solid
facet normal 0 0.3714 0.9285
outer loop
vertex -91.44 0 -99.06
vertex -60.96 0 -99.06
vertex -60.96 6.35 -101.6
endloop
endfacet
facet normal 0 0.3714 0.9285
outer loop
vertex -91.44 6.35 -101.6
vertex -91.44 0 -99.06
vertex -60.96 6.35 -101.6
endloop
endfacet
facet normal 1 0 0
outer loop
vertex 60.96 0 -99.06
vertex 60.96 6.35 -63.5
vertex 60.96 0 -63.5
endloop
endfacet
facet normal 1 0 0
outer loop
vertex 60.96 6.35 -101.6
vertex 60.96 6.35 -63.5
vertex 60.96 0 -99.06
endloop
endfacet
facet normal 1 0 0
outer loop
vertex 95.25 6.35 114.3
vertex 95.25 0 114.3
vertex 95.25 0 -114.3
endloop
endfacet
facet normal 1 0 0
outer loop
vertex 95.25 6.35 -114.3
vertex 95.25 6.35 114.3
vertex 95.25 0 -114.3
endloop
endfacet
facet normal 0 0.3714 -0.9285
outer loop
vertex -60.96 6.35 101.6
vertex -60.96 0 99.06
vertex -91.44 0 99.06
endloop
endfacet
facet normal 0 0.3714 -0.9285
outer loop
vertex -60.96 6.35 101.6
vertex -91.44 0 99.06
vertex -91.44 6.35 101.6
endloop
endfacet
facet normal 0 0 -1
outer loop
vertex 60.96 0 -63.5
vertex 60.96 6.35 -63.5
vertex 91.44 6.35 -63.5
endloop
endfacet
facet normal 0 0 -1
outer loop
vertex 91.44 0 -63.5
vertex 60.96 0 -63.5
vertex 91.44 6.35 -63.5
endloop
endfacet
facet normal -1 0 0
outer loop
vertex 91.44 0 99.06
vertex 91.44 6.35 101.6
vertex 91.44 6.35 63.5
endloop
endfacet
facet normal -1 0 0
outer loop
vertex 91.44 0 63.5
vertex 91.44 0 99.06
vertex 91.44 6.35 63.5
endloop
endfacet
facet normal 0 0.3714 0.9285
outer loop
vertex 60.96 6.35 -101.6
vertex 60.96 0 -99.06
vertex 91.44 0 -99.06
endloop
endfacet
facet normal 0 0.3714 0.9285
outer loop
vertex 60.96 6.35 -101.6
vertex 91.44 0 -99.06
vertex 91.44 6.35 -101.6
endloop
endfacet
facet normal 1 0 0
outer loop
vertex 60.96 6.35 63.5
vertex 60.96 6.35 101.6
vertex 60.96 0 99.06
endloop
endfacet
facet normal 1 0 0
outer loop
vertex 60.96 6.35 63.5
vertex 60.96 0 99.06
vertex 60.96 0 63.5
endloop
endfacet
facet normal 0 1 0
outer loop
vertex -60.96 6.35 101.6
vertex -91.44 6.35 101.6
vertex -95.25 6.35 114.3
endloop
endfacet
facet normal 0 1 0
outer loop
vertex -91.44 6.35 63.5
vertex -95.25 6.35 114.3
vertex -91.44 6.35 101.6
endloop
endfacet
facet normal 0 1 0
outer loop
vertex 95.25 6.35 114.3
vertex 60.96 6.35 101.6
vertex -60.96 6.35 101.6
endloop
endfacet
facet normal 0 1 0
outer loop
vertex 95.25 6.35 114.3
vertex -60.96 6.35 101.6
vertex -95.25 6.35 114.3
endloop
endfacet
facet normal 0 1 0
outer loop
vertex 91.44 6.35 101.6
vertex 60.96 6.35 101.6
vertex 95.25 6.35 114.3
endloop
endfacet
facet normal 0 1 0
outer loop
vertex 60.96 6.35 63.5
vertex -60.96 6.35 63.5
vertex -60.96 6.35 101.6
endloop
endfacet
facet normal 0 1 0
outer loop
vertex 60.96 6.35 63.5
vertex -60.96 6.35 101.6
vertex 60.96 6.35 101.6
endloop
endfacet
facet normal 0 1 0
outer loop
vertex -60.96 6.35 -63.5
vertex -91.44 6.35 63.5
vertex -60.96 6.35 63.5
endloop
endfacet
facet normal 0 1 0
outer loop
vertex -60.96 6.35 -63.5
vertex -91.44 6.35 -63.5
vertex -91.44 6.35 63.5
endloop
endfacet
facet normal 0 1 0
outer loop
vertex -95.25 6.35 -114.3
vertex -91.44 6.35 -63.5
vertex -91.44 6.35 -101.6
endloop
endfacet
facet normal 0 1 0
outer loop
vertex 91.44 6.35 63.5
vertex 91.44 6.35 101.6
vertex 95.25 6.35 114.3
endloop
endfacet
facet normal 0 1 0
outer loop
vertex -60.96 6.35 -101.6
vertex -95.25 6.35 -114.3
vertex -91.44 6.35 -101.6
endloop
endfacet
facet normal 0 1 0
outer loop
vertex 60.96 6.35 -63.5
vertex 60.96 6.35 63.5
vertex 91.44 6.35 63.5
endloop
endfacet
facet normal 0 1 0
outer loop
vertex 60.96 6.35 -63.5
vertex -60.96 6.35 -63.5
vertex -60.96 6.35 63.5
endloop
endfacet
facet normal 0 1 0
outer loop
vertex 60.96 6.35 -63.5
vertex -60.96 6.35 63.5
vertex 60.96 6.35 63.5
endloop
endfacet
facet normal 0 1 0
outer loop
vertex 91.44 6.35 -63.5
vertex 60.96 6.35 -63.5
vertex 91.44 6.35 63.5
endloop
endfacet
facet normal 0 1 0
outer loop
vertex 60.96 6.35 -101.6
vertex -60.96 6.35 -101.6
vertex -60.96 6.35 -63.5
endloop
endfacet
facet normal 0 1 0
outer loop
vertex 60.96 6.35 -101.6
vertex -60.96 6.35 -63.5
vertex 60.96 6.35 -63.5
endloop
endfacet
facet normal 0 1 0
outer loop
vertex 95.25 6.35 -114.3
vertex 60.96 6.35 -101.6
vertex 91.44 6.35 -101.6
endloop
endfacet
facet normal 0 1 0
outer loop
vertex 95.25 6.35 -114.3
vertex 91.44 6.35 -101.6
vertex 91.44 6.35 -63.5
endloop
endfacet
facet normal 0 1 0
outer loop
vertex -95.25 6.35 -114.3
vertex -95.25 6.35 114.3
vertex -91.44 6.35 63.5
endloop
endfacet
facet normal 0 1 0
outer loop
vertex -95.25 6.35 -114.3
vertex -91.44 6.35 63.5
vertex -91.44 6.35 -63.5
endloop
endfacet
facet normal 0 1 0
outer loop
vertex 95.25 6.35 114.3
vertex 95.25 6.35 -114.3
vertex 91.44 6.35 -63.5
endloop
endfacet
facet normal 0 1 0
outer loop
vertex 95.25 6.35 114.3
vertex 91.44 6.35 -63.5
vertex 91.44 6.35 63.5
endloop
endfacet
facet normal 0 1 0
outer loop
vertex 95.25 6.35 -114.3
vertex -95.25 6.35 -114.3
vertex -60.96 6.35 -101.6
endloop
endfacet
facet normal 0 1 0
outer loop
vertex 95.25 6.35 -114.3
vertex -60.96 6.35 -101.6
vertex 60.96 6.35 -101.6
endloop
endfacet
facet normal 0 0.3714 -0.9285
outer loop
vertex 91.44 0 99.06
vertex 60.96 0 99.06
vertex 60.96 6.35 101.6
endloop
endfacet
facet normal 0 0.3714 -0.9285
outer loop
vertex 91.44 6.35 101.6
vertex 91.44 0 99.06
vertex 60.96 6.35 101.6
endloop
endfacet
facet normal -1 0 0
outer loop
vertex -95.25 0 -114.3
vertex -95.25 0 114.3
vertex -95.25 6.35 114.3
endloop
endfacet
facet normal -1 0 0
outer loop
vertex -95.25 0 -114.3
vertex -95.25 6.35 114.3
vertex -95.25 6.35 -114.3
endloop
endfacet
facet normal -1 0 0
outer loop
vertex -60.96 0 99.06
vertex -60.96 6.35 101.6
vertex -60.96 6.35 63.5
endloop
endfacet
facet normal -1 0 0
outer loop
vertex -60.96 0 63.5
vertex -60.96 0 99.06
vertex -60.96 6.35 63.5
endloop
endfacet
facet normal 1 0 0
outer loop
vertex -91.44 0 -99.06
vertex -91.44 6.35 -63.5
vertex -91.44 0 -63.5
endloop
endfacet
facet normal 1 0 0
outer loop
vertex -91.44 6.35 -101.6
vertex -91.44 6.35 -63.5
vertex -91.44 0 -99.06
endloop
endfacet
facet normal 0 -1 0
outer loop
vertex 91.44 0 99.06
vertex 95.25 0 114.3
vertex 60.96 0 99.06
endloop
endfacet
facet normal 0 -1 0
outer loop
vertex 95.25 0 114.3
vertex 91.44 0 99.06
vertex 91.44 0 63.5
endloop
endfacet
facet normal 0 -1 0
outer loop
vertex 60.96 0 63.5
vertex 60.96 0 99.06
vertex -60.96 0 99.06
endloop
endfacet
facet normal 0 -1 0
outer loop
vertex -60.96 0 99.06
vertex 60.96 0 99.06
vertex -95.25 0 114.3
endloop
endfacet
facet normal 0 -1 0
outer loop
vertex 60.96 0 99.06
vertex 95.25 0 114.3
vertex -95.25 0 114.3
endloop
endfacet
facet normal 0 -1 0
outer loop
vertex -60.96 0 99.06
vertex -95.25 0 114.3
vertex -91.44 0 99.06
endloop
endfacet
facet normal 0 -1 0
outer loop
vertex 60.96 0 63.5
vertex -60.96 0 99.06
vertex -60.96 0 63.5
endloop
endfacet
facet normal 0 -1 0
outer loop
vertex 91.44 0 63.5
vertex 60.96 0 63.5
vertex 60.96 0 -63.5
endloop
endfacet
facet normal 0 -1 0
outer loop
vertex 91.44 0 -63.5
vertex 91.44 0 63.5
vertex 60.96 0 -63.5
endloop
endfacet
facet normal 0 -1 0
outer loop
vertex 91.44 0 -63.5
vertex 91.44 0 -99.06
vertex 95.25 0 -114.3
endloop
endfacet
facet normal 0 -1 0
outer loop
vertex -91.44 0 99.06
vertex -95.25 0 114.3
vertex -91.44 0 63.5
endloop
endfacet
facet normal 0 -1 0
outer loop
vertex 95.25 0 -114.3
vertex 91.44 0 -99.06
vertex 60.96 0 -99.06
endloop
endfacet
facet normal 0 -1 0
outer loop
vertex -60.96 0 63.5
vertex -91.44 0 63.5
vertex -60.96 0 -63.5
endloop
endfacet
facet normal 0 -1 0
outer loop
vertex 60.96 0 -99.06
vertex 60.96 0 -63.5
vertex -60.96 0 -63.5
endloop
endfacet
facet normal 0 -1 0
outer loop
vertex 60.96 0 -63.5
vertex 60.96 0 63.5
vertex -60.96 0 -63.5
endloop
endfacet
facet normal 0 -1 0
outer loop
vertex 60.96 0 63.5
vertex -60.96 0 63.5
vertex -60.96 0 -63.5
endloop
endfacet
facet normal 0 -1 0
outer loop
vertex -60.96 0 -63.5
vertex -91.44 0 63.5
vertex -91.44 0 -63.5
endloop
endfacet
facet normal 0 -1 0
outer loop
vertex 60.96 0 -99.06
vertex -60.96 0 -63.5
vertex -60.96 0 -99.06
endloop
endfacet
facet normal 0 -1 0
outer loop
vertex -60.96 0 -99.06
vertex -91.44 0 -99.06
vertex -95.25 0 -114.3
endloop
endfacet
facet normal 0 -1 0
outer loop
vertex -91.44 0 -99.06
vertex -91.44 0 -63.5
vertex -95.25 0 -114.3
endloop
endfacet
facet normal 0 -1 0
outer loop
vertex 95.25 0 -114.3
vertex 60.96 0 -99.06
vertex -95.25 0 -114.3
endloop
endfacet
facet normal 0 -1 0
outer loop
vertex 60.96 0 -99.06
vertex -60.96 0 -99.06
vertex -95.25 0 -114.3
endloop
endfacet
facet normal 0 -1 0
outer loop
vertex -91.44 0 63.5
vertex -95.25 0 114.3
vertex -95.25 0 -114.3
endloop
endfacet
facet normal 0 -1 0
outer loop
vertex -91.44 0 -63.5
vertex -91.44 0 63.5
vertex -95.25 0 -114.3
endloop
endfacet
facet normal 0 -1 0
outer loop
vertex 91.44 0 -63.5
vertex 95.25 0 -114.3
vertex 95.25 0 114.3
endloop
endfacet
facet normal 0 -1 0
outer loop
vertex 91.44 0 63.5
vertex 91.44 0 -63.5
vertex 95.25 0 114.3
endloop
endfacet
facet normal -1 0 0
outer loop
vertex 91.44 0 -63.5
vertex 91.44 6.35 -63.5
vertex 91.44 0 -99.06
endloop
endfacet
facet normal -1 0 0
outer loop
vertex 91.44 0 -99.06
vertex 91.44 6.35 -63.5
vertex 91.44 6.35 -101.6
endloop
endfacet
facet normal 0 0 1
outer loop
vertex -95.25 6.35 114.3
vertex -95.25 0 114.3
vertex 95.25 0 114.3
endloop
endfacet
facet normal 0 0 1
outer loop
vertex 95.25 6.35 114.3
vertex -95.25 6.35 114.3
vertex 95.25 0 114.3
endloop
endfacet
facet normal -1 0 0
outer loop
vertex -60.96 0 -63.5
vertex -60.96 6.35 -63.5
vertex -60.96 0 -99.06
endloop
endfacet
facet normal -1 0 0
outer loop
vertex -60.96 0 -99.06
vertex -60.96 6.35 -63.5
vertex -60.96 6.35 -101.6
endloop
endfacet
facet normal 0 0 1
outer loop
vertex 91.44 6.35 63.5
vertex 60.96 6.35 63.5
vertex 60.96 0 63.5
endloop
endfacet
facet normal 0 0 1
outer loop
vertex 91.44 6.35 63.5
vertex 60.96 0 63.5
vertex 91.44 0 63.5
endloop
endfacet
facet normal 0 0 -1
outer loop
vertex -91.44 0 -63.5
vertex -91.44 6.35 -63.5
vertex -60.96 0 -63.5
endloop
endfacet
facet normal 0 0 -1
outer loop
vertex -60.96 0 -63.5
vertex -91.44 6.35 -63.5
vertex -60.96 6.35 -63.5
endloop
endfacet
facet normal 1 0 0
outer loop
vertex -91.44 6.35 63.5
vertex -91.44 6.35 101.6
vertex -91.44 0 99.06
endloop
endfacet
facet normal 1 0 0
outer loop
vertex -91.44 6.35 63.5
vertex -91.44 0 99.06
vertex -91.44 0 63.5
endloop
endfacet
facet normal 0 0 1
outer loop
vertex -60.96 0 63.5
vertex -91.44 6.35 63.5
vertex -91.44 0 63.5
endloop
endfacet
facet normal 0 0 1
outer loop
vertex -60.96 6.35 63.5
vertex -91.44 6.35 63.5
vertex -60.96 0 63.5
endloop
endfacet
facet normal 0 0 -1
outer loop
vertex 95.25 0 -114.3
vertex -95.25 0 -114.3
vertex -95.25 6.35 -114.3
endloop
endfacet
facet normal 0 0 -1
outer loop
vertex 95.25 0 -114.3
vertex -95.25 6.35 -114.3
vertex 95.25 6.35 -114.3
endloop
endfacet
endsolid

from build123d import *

# Parameters (mm, degrees)
SKETCH1_W            = 190.5
SKETCH1_H            = 228.6
BOSS_EXTRUDE1_DEPTH  = 6.35
CUT_EXTRUDE1_REACH   = 8.35
SKETCH2_W            = 30.48
SKETCH2_H            = 38.1
BOSS_EXTRUDE2_DEPTH  = 30.48
MIRROR2_COPY_1_DEPTH = 30.48


with BuildPart() as part:
    # Sketch1 → Boss-Extrude1 (new body)
    with BuildSketch(Plane(origin=(0, 0, 0), x_dir=(1, 0, 0), z_dir=(0, 1, 0))):
        Rectangle(SKETCH1_W, SKETCH1_H)
    extrude(amount=BOSS_EXTRUDE1_DEPTH)

    # Sketch2 → Cut-Extrude1 (cut, up to next)
    with BuildSketch(Plane(origin=(0, 6.35, 0), x_dir=(1, 0, 0), z_dir=(0, 1, 0)), mode=Mode.PRIVATE) as cut_extrude1_sk1:
        with Locations((-76.2, 82.55)):
            Rectangle(SKETCH2_W, SKETCH2_H)
    cut_extrude1_tool1 = extrude(cut_extrude1_sk1.sketch, amount=-CUT_EXTRUDE1_REACH, mode=Mode.PRIVATE) & part.part
    add(cut_extrude1_tool1.solids().sort_by_distance((-76.2, 6.35, -82.55))[0], mode=Mode.SUBTRACT)
    # Sketch2 → Cut-Extrude1 (cut, up to next)
    with BuildSketch(Plane(origin=(0, 6.35, 0), x_dir=(1, 0, 0), z_dir=(0, 1, 0)), mode=Mode.PRIVATE) as cut_extrude1_sk2:
        with Locations((-76.2, -82.55)):
            Rectangle(SKETCH2_W, SKETCH2_H)
    cut_extrude1_tool2 = extrude(cut_extrude1_sk2.sketch, amount=-CUT_EXTRUDE1_REACH, mode=Mode.PRIVATE) & part.part
    add(cut_extrude1_tool2.solids().sort_by_distance((-76.2, 6.35, 82.55))[0], mode=Mode.SUBTRACT)
    # Sketch2 → Cut-Extrude1 (cut, up to next)
    with BuildSketch(Plane(origin=(0, 6.35, 0), x_dir=(1, 0, 0), z_dir=(0, 1, 0)), mode=Mode.PRIVATE) as cut_extrude1_sk3:
        with Locations((76.2, -82.55)):
            Rectangle(SKETCH2_W, SKETCH2_H)
    cut_extrude1_tool3 = extrude(cut_extrude1_sk3.sketch, amount=-CUT_EXTRUDE1_REACH, mode=Mode.PRIVATE) & part.part
    add(cut_extrude1_tool3.solids().sort_by_distance((76.2, 6.35, 82.55))[0], mode=Mode.SUBTRACT)
    # Sketch2 → Cut-Extrude1 (cut, up to next)
    with BuildSketch(Plane(origin=(0, 6.35, 0), x_dir=(1, 0, 0), z_dir=(0, 1, 0)), mode=Mode.PRIVATE) as cut_extrude1_sk4:
        with Locations((76.2, 82.55)):
            Rectangle(SKETCH2_W, SKETCH2_H)
    cut_extrude1_tool4 = extrude(cut_extrude1_sk4.sketch, amount=-CUT_EXTRUDE1_REACH, mode=Mode.PRIVATE) & part.part
    add(cut_extrude1_tool4.solids().sort_by_distance((76.2, 6.35, -82.55))[0], mode=Mode.SUBTRACT)

    # Sketch3 → Boss-Extrude2 (add)
    with BuildSketch(Plane.ZY.offset(-91.44)):
        Polygon((-101.6, 6.35), (-101.6, 0), (-99.06, 0), align=None)
    boss_extrude2 = extrude(amount=BOSS_EXTRUDE2_DEPTH)

    # Mirror1: Boss-Extrude2 across plane
    add(boss_extrude2.mirror(Plane.XY))

    # Mirror2: Boss-Extrude2 across plane
    add(boss_extrude2.mirror(Plane(origin=(0, 0, 0), x_dir=(0, 0, 1), z_dir=(1, 0, 0))))

    # Mirror2 copy 1 sketch → Mirror2 copy 1 (add)
    with BuildSketch(Plane(origin=(-91.44, 0, 0), x_dir=(0, 0, -1), z_dir=(1, 0, 0))):
        Polygon((-101.6, 6.35), (-101.6, 0), (-99.06, 0), align=None)
    extrude(amount=MIRROR2_COPY_1_DEPTH)


solid = part.part
